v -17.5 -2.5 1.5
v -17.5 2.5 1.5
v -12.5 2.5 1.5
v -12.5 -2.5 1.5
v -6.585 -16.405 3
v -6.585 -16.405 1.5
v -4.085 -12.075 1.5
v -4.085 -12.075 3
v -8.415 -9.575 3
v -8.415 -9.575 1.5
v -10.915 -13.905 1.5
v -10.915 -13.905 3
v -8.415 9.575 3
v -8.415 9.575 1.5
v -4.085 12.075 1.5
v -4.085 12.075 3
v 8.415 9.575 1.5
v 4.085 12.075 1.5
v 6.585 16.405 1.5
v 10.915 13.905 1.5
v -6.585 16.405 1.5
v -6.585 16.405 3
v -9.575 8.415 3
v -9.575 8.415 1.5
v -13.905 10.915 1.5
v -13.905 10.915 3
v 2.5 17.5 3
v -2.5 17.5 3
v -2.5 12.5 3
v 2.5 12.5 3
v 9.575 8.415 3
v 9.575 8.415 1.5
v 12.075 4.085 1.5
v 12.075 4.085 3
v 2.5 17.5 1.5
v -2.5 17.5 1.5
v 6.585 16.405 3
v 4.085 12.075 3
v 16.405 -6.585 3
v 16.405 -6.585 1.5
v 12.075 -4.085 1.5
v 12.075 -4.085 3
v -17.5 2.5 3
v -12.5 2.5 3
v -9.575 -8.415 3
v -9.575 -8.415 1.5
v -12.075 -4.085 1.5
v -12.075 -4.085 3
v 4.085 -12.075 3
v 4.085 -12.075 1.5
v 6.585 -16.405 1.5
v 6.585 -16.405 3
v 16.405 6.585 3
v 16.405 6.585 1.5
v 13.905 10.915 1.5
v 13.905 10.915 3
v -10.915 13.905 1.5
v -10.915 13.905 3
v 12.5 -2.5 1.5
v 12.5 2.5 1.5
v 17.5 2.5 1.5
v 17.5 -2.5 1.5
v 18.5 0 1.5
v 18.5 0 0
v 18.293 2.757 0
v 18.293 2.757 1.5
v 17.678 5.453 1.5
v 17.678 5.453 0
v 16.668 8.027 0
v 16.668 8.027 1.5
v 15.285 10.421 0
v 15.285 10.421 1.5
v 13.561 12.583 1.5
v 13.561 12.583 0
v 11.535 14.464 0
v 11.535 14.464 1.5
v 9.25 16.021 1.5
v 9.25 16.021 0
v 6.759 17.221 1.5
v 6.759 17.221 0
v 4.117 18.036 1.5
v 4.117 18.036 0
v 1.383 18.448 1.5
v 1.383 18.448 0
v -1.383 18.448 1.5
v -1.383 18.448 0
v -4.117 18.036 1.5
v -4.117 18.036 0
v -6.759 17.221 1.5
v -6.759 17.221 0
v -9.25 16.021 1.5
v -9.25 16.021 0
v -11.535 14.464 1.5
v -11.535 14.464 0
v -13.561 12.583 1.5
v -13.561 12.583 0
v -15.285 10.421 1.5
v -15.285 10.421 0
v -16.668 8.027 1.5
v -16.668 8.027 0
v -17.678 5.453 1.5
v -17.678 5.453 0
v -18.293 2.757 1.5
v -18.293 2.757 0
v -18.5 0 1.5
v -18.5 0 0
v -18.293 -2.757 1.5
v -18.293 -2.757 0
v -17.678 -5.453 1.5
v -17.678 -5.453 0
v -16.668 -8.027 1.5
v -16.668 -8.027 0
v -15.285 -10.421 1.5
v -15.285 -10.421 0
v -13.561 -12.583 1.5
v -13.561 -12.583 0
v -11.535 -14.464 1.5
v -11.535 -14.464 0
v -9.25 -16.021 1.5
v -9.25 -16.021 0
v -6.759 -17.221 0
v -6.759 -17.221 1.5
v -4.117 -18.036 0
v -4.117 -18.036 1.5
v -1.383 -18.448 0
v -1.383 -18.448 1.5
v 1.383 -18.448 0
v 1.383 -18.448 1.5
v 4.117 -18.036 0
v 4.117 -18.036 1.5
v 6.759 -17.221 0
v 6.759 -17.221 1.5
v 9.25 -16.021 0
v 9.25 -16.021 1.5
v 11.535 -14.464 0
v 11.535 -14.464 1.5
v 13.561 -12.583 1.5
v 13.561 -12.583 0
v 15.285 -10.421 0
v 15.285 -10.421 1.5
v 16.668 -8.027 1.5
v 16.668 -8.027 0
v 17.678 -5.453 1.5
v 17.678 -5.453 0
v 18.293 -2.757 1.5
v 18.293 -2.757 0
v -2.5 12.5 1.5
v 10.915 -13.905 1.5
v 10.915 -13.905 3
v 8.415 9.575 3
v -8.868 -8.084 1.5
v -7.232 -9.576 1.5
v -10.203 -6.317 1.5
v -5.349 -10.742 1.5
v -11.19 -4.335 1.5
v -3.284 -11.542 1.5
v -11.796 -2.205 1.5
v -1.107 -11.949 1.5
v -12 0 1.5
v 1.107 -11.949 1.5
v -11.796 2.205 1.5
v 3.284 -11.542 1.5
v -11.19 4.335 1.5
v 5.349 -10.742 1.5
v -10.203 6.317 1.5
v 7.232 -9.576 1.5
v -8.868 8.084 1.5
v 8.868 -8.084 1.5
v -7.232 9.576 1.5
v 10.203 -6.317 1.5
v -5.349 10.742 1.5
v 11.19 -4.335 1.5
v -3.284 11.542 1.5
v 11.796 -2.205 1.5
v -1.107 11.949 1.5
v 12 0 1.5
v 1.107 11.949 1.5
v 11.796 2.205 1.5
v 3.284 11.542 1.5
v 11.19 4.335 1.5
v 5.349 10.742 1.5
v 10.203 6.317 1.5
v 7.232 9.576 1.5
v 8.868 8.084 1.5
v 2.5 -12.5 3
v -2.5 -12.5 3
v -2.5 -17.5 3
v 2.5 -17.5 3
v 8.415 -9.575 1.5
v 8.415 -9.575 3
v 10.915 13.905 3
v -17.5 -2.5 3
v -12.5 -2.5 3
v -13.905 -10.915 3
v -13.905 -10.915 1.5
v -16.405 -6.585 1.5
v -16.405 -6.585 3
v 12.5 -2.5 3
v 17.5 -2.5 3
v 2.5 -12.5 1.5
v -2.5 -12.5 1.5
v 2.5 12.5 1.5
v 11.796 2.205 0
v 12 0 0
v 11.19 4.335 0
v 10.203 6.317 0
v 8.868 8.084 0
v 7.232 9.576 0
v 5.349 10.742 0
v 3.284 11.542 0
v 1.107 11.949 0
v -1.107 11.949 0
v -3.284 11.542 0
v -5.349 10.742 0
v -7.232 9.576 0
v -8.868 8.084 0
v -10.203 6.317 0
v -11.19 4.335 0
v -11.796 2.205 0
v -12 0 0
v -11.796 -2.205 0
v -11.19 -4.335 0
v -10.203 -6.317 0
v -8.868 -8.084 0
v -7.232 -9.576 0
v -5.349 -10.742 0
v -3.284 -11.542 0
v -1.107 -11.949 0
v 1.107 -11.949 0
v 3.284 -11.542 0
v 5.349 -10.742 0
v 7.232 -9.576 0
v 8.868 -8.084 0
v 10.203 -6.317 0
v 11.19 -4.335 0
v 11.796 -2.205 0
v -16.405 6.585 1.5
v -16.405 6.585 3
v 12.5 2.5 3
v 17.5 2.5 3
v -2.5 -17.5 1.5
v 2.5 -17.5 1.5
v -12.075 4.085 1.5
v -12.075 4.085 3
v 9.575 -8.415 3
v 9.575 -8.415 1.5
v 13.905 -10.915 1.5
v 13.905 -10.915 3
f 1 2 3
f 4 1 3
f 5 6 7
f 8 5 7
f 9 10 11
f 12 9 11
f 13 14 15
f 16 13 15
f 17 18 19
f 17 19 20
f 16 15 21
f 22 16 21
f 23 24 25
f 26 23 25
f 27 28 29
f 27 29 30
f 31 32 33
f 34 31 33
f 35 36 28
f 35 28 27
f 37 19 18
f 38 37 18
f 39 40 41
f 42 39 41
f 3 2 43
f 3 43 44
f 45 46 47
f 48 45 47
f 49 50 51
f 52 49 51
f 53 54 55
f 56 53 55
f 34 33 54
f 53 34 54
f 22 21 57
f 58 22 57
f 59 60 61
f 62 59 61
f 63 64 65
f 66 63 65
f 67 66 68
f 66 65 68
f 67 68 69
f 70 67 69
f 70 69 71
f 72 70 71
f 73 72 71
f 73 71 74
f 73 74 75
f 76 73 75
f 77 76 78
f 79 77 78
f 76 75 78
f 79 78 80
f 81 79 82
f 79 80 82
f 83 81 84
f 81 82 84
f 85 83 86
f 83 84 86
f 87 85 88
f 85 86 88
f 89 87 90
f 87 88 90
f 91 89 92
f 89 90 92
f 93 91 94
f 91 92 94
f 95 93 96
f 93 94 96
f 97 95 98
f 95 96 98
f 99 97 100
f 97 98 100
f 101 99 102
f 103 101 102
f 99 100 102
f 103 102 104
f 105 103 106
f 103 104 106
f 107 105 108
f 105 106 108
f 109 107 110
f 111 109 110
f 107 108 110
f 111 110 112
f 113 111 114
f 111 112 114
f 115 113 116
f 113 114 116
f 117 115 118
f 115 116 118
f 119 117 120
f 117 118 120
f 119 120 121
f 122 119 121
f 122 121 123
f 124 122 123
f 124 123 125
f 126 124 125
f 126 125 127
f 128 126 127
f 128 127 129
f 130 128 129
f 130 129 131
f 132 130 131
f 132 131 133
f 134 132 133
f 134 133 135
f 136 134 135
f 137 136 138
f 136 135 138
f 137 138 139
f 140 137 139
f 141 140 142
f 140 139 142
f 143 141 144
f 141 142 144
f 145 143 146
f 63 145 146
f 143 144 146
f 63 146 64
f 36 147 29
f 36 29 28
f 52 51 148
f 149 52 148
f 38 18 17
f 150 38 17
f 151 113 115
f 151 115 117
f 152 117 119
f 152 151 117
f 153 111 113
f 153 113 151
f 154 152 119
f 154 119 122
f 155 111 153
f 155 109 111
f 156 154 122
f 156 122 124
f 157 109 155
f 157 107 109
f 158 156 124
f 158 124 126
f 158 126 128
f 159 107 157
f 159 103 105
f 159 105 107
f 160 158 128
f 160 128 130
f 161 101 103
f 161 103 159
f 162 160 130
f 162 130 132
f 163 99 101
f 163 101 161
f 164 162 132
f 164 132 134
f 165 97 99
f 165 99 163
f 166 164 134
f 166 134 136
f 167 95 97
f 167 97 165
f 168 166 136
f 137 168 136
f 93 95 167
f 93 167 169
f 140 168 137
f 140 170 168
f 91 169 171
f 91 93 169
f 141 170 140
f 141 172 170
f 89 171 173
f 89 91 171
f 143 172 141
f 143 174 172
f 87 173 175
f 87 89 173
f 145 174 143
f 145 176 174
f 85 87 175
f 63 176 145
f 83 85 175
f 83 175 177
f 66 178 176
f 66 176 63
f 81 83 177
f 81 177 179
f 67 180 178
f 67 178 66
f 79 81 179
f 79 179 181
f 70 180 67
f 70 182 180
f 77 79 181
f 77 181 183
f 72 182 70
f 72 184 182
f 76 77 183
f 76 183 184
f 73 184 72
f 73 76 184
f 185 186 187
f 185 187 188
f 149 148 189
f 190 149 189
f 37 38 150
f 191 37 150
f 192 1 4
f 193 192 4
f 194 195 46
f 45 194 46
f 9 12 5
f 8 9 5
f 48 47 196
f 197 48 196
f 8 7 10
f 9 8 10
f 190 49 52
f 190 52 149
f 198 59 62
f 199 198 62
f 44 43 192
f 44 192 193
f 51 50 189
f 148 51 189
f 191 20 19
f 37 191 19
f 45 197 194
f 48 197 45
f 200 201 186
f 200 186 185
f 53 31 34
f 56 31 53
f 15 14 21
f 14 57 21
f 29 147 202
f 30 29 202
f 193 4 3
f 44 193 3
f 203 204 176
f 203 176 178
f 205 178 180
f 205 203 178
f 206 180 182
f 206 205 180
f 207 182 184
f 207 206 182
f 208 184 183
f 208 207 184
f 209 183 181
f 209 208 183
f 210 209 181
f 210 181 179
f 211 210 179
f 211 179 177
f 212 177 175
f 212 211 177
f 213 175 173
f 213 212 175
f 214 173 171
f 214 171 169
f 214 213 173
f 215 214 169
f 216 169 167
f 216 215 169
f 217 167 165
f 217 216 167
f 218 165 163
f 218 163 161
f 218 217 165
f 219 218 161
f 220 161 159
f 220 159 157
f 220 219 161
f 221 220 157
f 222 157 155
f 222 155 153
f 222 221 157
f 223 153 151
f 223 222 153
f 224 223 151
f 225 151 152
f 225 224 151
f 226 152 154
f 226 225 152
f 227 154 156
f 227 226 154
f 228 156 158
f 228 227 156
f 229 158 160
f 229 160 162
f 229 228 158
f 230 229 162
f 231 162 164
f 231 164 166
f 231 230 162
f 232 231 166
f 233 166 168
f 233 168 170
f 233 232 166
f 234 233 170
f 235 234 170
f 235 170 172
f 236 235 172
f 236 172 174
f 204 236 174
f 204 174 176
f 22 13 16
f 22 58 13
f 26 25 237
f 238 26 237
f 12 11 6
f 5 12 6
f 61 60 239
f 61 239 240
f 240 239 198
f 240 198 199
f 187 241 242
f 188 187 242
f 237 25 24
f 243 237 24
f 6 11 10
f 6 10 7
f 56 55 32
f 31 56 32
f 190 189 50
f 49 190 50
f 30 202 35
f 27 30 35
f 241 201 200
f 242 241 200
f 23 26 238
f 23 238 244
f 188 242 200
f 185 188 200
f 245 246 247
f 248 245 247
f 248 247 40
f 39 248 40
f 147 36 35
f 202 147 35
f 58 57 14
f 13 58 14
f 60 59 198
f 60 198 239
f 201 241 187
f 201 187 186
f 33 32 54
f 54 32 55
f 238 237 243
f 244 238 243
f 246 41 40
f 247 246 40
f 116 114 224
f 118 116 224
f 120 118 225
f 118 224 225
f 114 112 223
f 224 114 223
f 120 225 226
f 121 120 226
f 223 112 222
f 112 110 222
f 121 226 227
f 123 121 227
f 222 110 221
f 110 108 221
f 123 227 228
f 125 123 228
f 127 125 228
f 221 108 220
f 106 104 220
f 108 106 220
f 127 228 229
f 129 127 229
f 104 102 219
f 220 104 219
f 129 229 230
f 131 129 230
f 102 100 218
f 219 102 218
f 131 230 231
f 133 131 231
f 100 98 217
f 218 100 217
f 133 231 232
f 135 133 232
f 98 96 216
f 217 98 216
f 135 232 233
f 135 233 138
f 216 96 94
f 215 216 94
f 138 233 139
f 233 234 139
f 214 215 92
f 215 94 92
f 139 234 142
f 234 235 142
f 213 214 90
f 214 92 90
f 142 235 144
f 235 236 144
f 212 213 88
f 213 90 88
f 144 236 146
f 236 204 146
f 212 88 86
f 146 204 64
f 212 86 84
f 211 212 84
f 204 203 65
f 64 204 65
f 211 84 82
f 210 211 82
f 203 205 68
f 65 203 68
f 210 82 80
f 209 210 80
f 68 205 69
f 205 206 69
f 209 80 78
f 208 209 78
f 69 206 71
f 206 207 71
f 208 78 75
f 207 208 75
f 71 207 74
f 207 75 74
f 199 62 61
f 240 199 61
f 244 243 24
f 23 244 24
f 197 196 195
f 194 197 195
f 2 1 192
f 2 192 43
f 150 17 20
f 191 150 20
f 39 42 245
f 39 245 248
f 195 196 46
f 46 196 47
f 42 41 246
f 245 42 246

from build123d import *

# Parameters (mm, degrees)
F0_R     = 18.5
F0_R_2   = 12
F1_DEPTH = 1.5
F2_W     = 5
F2_H     = 5
F3_DEPTH = 1.5


# Not quite as in the source:
# - a feature of the source that left no trace in its solid (it failed there, or was rolled back) is left out


with BuildPart() as f1:
    # F0 (on Top) → F1 (new body)
    with BuildSketch(Plane.XY):
        Circle(F0_R)
        Circle(F0_R_2, mode=Mode.SUBTRACT)
    extrude(amount=F1_DEPTH)


with BuildPart() as f3:
    # F2 (on face) → F3 (new body)
    with BuildSketch(Plane.XY.offset(1.5)):
        with Locations((-15, 0)):
            Rectangle(F2_W, F2_H)
    extrude(amount=F3_DEPTH)


with BuildPart() as f3b:
    # F2 (on face) → F3, piece 2 (new body)
    with BuildSketch(Plane.XY.offset(1.5)):
        Polygon((-9.5753175473, -8.4150635095), (-12.0753175473, -4.0849364905), (-16.4054445662, -6.5849364905), (-13.9054445662, -10.9150635095), align=None)
    extrude(amount=F3_DEPTH)


with BuildPart() as f3c:
    # F2 (on face) → F3, piece 3 (new body)
    with BuildSketch(Plane.XY.offset(1.5)):
        Polygon((-4.0849364905, -12.0753175473), (-8.4150635095, -9.5753175473), (-10.9150635095, -13.9054445662), (-6.5849364905, -16.4054445662), align=None)
    extrude(amount=F3_DEPTH)


with BuildPart() as f3d:
    # F2 (on face) → F3, piece 4 (new body)
    with BuildSketch(Plane.XY.offset(1.5)):
        with Locations((0, -15)):
            Rectangle(F2_W, F2_H)
    extrude(amount=F3_DEPTH)


with BuildPart() as f3e:
    # F2 (on face) → F3, piece 5 (new body)
    with BuildSketch(Plane.XY.offset(1.5)):
        Polygon((8.4150635095, -9.5753175473), (4.0849364905, -12.0753175473), (6.5849364905, -16.4054445662), (10.9150635095, -13.9054445662), align=None)
    extrude(amount=F3_DEPTH)


with BuildPart() as f3f:
    # F2 (on face) → F3, piece 6 (new body)
    with BuildSketch(Plane.XY.offset(1.5)):
        Polygon((12.0753175473, -4.0849364905), (9.5753175473, -8.4150635095), (13.9054445662, -10.9150635095), (16.4054445662, -6.5849364905), align=None)
    extrude(amount=F3_DEPTH)


with BuildPart() as f3g:
    # F2 (on face) → F3, piece 7 (new body)
    with BuildSketch(Plane.XY.offset(1.5)):
        with Locations((15, 0)):
            Rectangle(F2_W, F2_H)
    extrude(amount=F3_DEPTH)


with BuildPart() as f3h:
    # F2 (on face) → F3, piece 8 (new body)
    with BuildSketch(Plane.XY.offset(1.5)):
        Polygon((9.5753175473, 8.4150635095), (12.0753175473, 4.0849364905), (16.4054445662, 6.5849364905), (13.9054445662, 10.9150635095), align=None)
    extrude(amount=F3_DEPTH)


with BuildPart() as f3i:
    # F2 (on face) → F3, piece 9 (new body)
    with BuildSketch(Plane.XY.offset(1.5)):
        Polygon((4.0849364905, 12.0753175473), (8.4150635095, 9.5753175473), (10.9150635095, 13.9054445662), (6.5849364905, 16.4054445662), align=None)
    extrude(amount=F3_DEPTH)


with BuildPart() as f3j:
    # F2 (on face) → F3, piece 10 (new body)
    with BuildSketch(Plane.XY.offset(1.5)):
        with Locations((0, 15)):
            Rectangle(F2_W, F2_H)
    extrude(amount=F3_DEPTH)


with BuildPart() as f3k:
    # F2 (on face) → F3, piece 11 (new body)
    with BuildSketch(Plane.XY.offset(1.5)):
        Polygon((-8.4150635095, 9.5753175473), (-4.0849364905, 12.0753175473), (-6.5849364905, 16.4054445662), (-10.9150635095, 13.9054445662), align=None)
    extrude(amount=F3_DEPTH)


with BuildPart() as f3l:
    # F2 (on face) → F3, piece 12 (new body)
    with BuildSketch(Plane.XY.offset(1.5)):
        Polygon((-12.0753175473, 4.0849364905), (-9.5753175473, 8.4150635095), (-13.9054445662, 10.9150635095), (-16.4054445662, 6.5849364905), align=None)
    extrude(amount=F3_DEPTH)


solid = Compound([f1.part, f3.part, f3b.part, f3c.part, f3d.part, f3e.part, f3f.part, f3g.part, f3h.part, f3i.part, f3j.part, f3k.part, f3l.part])
